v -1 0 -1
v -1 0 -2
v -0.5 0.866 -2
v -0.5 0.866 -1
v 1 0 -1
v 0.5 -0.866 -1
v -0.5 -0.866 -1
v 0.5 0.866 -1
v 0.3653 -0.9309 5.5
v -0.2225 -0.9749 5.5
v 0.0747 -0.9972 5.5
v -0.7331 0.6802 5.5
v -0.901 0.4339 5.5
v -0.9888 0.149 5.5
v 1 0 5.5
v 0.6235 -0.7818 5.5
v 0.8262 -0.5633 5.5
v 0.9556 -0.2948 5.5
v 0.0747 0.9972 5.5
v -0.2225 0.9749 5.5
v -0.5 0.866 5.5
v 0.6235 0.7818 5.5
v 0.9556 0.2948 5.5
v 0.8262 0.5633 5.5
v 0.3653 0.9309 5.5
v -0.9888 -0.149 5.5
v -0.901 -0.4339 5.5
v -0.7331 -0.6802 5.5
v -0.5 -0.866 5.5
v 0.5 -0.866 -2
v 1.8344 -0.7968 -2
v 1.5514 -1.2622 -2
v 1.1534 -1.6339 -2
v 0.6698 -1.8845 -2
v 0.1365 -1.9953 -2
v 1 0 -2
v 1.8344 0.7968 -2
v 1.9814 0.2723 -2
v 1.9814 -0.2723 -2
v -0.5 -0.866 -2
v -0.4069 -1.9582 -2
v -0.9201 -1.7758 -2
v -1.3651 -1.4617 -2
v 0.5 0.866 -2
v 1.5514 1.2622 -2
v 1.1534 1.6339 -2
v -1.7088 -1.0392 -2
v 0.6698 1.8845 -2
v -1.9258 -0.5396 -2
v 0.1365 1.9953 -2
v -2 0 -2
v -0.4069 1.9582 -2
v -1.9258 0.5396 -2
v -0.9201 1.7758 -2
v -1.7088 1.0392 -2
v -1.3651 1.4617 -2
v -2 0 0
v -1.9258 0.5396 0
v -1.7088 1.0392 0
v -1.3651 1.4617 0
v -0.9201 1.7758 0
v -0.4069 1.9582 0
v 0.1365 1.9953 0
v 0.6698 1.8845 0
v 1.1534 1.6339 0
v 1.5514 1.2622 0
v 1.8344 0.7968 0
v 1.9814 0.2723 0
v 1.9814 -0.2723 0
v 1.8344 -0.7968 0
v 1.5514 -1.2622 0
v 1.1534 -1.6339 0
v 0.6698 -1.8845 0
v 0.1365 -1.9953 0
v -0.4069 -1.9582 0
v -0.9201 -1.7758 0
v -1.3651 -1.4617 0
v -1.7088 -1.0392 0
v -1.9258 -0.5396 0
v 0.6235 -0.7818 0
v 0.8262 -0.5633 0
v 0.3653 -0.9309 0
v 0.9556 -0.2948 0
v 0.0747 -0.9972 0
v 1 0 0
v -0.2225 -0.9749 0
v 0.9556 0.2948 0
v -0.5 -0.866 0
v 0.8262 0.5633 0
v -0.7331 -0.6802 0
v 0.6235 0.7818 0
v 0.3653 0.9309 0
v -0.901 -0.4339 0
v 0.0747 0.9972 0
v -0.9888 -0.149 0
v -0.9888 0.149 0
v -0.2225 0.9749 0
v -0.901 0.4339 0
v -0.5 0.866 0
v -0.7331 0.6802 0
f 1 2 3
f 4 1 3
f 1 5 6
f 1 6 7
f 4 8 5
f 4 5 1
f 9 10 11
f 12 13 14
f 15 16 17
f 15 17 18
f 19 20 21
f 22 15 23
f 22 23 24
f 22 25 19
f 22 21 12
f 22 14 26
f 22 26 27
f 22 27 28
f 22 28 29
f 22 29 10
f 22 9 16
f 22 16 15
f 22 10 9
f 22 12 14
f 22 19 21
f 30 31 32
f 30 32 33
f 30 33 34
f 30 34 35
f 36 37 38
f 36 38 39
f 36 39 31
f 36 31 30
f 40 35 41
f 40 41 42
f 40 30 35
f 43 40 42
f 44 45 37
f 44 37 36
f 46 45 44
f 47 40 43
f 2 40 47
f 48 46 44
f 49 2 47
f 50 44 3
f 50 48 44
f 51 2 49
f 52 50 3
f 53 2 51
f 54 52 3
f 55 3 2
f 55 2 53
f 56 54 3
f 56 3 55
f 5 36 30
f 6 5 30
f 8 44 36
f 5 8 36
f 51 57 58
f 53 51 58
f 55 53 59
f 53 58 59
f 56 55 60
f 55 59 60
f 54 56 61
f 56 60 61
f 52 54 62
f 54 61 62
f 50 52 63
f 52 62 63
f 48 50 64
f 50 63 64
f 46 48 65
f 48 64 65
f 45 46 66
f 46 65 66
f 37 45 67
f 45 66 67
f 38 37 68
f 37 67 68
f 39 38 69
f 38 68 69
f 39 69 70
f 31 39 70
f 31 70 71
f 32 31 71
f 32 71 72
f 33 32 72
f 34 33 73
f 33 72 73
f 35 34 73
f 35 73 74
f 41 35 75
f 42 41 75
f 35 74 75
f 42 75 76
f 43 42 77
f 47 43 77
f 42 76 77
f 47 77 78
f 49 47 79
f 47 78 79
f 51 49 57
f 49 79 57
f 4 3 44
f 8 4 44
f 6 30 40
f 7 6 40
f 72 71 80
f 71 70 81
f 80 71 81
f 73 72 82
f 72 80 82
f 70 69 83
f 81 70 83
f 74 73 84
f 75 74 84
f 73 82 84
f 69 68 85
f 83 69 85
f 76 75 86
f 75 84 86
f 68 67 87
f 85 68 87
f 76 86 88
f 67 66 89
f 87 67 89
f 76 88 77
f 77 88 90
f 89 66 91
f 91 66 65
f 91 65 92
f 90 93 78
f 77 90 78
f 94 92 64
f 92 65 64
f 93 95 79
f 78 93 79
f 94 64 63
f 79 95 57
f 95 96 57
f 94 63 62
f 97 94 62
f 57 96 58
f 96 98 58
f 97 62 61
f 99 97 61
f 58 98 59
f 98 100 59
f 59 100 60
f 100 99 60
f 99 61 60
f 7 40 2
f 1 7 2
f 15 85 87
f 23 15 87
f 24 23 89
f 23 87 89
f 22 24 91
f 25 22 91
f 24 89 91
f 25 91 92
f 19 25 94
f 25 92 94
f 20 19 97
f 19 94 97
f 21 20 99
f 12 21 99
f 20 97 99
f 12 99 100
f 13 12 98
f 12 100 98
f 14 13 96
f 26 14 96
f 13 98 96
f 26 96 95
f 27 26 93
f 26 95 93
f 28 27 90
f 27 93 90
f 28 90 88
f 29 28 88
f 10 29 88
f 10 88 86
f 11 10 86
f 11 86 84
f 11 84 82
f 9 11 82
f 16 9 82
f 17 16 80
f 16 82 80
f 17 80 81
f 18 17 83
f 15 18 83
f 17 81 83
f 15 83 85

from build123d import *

# Parameters (mm, degrees)
SKETCH_1_R          = 1
EXTRUDE_1_DEPTH     = 5.5
SKETCH_2_R          = 2
EXTRUDE_2_DEPTH     = 2
CUT_EXTRUDE_1_DEPTH = 1


with BuildPart() as part:
    # 草图1 → 凸台-拉伸1 (new body)
    with BuildSketch(Plane.XY):
        Circle(SKETCH_1_R)
    extrude(amount=EXTRUDE_1_DEPTH)

    # 草图2 → 凸台-拉伸2 (add)
    with BuildSketch(Plane(origin=(0, 0, 0), x_dir=(-1, 0, 0), z_dir=(0, 0, -1))):
        Circle(SKETCH_2_R)
    extrude(amount=EXTRUDE_2_DEPTH)

    # 草图3 → 切除-拉伸1 (cut)
    with BuildSketch(Plane(origin=(0, 0, -2), x_dir=(-1, 0, 0), z_dir=(0, 0, -1))):
        Polygon((1, 0), (0.5, 0.866025404), (-0.5, 0.866025404), (-1, 0), (-0.5, -0.866025404), (0.5, -0.866025404), align=None)
    extrude(amount=-CUT_EXTRUDE_1_DEPTH, mode=Mode.SUBTRACT)


solid = part.part
